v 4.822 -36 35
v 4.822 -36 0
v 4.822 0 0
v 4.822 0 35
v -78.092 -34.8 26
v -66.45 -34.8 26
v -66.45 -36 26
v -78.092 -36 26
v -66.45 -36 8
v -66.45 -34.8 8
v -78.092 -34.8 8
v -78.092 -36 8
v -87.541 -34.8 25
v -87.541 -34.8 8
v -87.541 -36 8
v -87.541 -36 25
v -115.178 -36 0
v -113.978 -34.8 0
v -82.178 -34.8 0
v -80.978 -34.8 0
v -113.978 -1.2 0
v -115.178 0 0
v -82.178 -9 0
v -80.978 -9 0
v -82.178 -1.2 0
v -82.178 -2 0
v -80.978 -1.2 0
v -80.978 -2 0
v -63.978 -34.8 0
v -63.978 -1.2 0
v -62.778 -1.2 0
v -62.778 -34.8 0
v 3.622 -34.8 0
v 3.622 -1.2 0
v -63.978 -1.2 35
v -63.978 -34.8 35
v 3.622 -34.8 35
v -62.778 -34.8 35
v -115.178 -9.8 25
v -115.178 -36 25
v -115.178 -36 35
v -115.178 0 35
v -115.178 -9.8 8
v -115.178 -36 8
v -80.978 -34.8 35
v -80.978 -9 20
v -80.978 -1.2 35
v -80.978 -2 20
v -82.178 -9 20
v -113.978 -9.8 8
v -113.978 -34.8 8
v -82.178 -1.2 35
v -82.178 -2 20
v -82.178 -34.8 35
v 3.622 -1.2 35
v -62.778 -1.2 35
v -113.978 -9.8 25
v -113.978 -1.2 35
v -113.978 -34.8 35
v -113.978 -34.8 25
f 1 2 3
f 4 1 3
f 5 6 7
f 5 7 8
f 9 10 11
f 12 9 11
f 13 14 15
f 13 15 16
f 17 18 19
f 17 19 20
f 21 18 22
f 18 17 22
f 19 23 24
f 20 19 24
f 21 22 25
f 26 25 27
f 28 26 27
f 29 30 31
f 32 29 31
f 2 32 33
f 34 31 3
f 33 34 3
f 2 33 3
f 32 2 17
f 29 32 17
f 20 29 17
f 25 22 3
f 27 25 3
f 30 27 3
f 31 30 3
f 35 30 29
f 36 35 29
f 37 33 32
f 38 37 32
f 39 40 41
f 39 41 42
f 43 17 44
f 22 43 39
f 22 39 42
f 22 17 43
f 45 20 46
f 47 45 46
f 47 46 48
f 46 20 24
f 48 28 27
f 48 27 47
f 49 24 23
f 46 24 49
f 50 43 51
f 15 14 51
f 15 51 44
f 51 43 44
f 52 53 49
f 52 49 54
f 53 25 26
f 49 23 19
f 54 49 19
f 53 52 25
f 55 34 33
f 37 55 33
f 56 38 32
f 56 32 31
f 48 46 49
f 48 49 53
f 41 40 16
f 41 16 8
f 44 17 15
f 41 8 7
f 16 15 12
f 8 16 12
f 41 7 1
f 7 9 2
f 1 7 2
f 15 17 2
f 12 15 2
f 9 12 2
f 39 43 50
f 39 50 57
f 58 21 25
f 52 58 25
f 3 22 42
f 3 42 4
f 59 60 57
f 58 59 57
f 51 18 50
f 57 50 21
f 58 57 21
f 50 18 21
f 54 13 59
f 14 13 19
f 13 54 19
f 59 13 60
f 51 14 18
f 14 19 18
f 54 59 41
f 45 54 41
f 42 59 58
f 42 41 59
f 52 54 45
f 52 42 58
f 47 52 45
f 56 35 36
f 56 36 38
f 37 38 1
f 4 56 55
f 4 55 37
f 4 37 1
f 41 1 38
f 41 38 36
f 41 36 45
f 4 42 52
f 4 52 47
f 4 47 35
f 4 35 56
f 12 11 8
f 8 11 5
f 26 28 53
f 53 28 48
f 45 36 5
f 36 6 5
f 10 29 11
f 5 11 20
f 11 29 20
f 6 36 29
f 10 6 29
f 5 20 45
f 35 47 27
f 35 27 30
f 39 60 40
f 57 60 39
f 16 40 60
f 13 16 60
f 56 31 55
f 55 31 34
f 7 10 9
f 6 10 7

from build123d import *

# Parameters (mm, degrees)
F0_W      = 120
F0_H      = 36
F1_DEPTH  = 35
F2_W      = 7
F2_H      = 20
F3_DEPTH  = 1.2
F4_W      = 11.6417678248
F4_H      = 18
F5_DEPTH  = 1.201
F6_W      = 25
F6_H      = 17
F7_DEPTH  = 1.2
F8_W      = 1.2
F8_H      = 17
F9_DEPTH  = 3
F10_W     = 25
F10_H     = 17
F11_DEPTH = 1.2


with BuildPart() as f1:
    # F0 (on Top) → F1 (new body)
    with BuildSketch(Plane.XY):
        with Locations((-55.1781901717, -18)):
            Rectangle(F0_W, F0_H)
        Polygon((-113.9781901717, -34.8), (-113.9781901717, -1.2), (-107.9781901717, -1.2), (-89.9781901717, -1.2), (-82.1781901717, -1.2), (-80.9781901717, -1.2), (-63.9781901717, -1.2), (-62.7781901717, -1.2), (-49.0207746625, -1.2), (-45.235440135, -1.2), (3.6218098283, -1.2), (3.6218098283, -34.8), (-62.7781901717, -34.8), (-63.9781901717, -34.8), (-80.9781901717, -34.8), (-82.1781901717, -34.8), align=None, mode=Mode.SUBTRACT)
        Polygon((-82.1781901717, -26.7), (-82.1781901717, -34.8), (-80.9781901717, -34.8), (-80.9781901717, -26.6408454627), (-80.9781901717, -8.1258974969), (-80.9781901717, -1.2), (-82.1781901717, -1.2), (-82.1781901717, -8.7), align=None)
        Polygon((-63.9781901717, -26.6408454627), (-63.9781901717, -34.8), (-62.7781901717, -34.8), (-62.7781901717, -1.2), (-63.9781901717, -1.2), (-63.9781901717, -8.1258974969), align=None)
    extrude(amount=F1_DEPTH)

    # F2 (on face) → F3 (cut)
    with BuildSketch(Plane.YZ.offset(-80.9781901717)):
        with Locations((-5.5, 10)):
            Rectangle(F2_W, F2_H)
    extrude(amount=-F3_DEPTH, mode=Mode.SUBTRACT)

    # F4 (on face) → F5 (cut, through all)
    with BuildSketch(Plane(origin=(0, -34.8, 0), x_dir=(-1, 0, 0), z_dir=(0, 1, 0))):
        with Locations((72.271104902, 17)):
            Rectangle(F4_W, F4_H)
    extrude(amount=-F5_DEPTH, mode=Mode.SUBTRACT)

    # F6 (on face) → F7 (cut)
    with BuildSketch(Plane(origin=(0, -34.8, 0), x_dir=(-1, 0, 0), z_dir=(0, 1, 0))):
        with Locations((100.0405803323, 16.5)):
            Rectangle(F6_W, F6_H)
    extrude(amount=-F7_DEPTH, mode=Mode.SUBTRACT)

    # F8 (on face) → F9 (cut)
    with BuildSketch(Plane.YZ.offset(-112.5405803323)):
        with Locations((-35.4, 16.5)):
            Rectangle(F8_W, F8_H)
    extrude(amount=-F9_DEPTH, mode=Mode.SUBTRACT)

    # F10 (on face) → F11 (cut)
    with BuildSketch(Plane(origin=(-115.1781901717, 0, 0), x_dir=(0, -1, 0), z_dir=(-1, 0, 0))):
        with Locations((22.3, 16.5)):
            Rectangle(F10_W, F10_H)
    extrude(amount=-F11_DEPTH, mode=Mode.SUBTRACT)


solid = f1.part
